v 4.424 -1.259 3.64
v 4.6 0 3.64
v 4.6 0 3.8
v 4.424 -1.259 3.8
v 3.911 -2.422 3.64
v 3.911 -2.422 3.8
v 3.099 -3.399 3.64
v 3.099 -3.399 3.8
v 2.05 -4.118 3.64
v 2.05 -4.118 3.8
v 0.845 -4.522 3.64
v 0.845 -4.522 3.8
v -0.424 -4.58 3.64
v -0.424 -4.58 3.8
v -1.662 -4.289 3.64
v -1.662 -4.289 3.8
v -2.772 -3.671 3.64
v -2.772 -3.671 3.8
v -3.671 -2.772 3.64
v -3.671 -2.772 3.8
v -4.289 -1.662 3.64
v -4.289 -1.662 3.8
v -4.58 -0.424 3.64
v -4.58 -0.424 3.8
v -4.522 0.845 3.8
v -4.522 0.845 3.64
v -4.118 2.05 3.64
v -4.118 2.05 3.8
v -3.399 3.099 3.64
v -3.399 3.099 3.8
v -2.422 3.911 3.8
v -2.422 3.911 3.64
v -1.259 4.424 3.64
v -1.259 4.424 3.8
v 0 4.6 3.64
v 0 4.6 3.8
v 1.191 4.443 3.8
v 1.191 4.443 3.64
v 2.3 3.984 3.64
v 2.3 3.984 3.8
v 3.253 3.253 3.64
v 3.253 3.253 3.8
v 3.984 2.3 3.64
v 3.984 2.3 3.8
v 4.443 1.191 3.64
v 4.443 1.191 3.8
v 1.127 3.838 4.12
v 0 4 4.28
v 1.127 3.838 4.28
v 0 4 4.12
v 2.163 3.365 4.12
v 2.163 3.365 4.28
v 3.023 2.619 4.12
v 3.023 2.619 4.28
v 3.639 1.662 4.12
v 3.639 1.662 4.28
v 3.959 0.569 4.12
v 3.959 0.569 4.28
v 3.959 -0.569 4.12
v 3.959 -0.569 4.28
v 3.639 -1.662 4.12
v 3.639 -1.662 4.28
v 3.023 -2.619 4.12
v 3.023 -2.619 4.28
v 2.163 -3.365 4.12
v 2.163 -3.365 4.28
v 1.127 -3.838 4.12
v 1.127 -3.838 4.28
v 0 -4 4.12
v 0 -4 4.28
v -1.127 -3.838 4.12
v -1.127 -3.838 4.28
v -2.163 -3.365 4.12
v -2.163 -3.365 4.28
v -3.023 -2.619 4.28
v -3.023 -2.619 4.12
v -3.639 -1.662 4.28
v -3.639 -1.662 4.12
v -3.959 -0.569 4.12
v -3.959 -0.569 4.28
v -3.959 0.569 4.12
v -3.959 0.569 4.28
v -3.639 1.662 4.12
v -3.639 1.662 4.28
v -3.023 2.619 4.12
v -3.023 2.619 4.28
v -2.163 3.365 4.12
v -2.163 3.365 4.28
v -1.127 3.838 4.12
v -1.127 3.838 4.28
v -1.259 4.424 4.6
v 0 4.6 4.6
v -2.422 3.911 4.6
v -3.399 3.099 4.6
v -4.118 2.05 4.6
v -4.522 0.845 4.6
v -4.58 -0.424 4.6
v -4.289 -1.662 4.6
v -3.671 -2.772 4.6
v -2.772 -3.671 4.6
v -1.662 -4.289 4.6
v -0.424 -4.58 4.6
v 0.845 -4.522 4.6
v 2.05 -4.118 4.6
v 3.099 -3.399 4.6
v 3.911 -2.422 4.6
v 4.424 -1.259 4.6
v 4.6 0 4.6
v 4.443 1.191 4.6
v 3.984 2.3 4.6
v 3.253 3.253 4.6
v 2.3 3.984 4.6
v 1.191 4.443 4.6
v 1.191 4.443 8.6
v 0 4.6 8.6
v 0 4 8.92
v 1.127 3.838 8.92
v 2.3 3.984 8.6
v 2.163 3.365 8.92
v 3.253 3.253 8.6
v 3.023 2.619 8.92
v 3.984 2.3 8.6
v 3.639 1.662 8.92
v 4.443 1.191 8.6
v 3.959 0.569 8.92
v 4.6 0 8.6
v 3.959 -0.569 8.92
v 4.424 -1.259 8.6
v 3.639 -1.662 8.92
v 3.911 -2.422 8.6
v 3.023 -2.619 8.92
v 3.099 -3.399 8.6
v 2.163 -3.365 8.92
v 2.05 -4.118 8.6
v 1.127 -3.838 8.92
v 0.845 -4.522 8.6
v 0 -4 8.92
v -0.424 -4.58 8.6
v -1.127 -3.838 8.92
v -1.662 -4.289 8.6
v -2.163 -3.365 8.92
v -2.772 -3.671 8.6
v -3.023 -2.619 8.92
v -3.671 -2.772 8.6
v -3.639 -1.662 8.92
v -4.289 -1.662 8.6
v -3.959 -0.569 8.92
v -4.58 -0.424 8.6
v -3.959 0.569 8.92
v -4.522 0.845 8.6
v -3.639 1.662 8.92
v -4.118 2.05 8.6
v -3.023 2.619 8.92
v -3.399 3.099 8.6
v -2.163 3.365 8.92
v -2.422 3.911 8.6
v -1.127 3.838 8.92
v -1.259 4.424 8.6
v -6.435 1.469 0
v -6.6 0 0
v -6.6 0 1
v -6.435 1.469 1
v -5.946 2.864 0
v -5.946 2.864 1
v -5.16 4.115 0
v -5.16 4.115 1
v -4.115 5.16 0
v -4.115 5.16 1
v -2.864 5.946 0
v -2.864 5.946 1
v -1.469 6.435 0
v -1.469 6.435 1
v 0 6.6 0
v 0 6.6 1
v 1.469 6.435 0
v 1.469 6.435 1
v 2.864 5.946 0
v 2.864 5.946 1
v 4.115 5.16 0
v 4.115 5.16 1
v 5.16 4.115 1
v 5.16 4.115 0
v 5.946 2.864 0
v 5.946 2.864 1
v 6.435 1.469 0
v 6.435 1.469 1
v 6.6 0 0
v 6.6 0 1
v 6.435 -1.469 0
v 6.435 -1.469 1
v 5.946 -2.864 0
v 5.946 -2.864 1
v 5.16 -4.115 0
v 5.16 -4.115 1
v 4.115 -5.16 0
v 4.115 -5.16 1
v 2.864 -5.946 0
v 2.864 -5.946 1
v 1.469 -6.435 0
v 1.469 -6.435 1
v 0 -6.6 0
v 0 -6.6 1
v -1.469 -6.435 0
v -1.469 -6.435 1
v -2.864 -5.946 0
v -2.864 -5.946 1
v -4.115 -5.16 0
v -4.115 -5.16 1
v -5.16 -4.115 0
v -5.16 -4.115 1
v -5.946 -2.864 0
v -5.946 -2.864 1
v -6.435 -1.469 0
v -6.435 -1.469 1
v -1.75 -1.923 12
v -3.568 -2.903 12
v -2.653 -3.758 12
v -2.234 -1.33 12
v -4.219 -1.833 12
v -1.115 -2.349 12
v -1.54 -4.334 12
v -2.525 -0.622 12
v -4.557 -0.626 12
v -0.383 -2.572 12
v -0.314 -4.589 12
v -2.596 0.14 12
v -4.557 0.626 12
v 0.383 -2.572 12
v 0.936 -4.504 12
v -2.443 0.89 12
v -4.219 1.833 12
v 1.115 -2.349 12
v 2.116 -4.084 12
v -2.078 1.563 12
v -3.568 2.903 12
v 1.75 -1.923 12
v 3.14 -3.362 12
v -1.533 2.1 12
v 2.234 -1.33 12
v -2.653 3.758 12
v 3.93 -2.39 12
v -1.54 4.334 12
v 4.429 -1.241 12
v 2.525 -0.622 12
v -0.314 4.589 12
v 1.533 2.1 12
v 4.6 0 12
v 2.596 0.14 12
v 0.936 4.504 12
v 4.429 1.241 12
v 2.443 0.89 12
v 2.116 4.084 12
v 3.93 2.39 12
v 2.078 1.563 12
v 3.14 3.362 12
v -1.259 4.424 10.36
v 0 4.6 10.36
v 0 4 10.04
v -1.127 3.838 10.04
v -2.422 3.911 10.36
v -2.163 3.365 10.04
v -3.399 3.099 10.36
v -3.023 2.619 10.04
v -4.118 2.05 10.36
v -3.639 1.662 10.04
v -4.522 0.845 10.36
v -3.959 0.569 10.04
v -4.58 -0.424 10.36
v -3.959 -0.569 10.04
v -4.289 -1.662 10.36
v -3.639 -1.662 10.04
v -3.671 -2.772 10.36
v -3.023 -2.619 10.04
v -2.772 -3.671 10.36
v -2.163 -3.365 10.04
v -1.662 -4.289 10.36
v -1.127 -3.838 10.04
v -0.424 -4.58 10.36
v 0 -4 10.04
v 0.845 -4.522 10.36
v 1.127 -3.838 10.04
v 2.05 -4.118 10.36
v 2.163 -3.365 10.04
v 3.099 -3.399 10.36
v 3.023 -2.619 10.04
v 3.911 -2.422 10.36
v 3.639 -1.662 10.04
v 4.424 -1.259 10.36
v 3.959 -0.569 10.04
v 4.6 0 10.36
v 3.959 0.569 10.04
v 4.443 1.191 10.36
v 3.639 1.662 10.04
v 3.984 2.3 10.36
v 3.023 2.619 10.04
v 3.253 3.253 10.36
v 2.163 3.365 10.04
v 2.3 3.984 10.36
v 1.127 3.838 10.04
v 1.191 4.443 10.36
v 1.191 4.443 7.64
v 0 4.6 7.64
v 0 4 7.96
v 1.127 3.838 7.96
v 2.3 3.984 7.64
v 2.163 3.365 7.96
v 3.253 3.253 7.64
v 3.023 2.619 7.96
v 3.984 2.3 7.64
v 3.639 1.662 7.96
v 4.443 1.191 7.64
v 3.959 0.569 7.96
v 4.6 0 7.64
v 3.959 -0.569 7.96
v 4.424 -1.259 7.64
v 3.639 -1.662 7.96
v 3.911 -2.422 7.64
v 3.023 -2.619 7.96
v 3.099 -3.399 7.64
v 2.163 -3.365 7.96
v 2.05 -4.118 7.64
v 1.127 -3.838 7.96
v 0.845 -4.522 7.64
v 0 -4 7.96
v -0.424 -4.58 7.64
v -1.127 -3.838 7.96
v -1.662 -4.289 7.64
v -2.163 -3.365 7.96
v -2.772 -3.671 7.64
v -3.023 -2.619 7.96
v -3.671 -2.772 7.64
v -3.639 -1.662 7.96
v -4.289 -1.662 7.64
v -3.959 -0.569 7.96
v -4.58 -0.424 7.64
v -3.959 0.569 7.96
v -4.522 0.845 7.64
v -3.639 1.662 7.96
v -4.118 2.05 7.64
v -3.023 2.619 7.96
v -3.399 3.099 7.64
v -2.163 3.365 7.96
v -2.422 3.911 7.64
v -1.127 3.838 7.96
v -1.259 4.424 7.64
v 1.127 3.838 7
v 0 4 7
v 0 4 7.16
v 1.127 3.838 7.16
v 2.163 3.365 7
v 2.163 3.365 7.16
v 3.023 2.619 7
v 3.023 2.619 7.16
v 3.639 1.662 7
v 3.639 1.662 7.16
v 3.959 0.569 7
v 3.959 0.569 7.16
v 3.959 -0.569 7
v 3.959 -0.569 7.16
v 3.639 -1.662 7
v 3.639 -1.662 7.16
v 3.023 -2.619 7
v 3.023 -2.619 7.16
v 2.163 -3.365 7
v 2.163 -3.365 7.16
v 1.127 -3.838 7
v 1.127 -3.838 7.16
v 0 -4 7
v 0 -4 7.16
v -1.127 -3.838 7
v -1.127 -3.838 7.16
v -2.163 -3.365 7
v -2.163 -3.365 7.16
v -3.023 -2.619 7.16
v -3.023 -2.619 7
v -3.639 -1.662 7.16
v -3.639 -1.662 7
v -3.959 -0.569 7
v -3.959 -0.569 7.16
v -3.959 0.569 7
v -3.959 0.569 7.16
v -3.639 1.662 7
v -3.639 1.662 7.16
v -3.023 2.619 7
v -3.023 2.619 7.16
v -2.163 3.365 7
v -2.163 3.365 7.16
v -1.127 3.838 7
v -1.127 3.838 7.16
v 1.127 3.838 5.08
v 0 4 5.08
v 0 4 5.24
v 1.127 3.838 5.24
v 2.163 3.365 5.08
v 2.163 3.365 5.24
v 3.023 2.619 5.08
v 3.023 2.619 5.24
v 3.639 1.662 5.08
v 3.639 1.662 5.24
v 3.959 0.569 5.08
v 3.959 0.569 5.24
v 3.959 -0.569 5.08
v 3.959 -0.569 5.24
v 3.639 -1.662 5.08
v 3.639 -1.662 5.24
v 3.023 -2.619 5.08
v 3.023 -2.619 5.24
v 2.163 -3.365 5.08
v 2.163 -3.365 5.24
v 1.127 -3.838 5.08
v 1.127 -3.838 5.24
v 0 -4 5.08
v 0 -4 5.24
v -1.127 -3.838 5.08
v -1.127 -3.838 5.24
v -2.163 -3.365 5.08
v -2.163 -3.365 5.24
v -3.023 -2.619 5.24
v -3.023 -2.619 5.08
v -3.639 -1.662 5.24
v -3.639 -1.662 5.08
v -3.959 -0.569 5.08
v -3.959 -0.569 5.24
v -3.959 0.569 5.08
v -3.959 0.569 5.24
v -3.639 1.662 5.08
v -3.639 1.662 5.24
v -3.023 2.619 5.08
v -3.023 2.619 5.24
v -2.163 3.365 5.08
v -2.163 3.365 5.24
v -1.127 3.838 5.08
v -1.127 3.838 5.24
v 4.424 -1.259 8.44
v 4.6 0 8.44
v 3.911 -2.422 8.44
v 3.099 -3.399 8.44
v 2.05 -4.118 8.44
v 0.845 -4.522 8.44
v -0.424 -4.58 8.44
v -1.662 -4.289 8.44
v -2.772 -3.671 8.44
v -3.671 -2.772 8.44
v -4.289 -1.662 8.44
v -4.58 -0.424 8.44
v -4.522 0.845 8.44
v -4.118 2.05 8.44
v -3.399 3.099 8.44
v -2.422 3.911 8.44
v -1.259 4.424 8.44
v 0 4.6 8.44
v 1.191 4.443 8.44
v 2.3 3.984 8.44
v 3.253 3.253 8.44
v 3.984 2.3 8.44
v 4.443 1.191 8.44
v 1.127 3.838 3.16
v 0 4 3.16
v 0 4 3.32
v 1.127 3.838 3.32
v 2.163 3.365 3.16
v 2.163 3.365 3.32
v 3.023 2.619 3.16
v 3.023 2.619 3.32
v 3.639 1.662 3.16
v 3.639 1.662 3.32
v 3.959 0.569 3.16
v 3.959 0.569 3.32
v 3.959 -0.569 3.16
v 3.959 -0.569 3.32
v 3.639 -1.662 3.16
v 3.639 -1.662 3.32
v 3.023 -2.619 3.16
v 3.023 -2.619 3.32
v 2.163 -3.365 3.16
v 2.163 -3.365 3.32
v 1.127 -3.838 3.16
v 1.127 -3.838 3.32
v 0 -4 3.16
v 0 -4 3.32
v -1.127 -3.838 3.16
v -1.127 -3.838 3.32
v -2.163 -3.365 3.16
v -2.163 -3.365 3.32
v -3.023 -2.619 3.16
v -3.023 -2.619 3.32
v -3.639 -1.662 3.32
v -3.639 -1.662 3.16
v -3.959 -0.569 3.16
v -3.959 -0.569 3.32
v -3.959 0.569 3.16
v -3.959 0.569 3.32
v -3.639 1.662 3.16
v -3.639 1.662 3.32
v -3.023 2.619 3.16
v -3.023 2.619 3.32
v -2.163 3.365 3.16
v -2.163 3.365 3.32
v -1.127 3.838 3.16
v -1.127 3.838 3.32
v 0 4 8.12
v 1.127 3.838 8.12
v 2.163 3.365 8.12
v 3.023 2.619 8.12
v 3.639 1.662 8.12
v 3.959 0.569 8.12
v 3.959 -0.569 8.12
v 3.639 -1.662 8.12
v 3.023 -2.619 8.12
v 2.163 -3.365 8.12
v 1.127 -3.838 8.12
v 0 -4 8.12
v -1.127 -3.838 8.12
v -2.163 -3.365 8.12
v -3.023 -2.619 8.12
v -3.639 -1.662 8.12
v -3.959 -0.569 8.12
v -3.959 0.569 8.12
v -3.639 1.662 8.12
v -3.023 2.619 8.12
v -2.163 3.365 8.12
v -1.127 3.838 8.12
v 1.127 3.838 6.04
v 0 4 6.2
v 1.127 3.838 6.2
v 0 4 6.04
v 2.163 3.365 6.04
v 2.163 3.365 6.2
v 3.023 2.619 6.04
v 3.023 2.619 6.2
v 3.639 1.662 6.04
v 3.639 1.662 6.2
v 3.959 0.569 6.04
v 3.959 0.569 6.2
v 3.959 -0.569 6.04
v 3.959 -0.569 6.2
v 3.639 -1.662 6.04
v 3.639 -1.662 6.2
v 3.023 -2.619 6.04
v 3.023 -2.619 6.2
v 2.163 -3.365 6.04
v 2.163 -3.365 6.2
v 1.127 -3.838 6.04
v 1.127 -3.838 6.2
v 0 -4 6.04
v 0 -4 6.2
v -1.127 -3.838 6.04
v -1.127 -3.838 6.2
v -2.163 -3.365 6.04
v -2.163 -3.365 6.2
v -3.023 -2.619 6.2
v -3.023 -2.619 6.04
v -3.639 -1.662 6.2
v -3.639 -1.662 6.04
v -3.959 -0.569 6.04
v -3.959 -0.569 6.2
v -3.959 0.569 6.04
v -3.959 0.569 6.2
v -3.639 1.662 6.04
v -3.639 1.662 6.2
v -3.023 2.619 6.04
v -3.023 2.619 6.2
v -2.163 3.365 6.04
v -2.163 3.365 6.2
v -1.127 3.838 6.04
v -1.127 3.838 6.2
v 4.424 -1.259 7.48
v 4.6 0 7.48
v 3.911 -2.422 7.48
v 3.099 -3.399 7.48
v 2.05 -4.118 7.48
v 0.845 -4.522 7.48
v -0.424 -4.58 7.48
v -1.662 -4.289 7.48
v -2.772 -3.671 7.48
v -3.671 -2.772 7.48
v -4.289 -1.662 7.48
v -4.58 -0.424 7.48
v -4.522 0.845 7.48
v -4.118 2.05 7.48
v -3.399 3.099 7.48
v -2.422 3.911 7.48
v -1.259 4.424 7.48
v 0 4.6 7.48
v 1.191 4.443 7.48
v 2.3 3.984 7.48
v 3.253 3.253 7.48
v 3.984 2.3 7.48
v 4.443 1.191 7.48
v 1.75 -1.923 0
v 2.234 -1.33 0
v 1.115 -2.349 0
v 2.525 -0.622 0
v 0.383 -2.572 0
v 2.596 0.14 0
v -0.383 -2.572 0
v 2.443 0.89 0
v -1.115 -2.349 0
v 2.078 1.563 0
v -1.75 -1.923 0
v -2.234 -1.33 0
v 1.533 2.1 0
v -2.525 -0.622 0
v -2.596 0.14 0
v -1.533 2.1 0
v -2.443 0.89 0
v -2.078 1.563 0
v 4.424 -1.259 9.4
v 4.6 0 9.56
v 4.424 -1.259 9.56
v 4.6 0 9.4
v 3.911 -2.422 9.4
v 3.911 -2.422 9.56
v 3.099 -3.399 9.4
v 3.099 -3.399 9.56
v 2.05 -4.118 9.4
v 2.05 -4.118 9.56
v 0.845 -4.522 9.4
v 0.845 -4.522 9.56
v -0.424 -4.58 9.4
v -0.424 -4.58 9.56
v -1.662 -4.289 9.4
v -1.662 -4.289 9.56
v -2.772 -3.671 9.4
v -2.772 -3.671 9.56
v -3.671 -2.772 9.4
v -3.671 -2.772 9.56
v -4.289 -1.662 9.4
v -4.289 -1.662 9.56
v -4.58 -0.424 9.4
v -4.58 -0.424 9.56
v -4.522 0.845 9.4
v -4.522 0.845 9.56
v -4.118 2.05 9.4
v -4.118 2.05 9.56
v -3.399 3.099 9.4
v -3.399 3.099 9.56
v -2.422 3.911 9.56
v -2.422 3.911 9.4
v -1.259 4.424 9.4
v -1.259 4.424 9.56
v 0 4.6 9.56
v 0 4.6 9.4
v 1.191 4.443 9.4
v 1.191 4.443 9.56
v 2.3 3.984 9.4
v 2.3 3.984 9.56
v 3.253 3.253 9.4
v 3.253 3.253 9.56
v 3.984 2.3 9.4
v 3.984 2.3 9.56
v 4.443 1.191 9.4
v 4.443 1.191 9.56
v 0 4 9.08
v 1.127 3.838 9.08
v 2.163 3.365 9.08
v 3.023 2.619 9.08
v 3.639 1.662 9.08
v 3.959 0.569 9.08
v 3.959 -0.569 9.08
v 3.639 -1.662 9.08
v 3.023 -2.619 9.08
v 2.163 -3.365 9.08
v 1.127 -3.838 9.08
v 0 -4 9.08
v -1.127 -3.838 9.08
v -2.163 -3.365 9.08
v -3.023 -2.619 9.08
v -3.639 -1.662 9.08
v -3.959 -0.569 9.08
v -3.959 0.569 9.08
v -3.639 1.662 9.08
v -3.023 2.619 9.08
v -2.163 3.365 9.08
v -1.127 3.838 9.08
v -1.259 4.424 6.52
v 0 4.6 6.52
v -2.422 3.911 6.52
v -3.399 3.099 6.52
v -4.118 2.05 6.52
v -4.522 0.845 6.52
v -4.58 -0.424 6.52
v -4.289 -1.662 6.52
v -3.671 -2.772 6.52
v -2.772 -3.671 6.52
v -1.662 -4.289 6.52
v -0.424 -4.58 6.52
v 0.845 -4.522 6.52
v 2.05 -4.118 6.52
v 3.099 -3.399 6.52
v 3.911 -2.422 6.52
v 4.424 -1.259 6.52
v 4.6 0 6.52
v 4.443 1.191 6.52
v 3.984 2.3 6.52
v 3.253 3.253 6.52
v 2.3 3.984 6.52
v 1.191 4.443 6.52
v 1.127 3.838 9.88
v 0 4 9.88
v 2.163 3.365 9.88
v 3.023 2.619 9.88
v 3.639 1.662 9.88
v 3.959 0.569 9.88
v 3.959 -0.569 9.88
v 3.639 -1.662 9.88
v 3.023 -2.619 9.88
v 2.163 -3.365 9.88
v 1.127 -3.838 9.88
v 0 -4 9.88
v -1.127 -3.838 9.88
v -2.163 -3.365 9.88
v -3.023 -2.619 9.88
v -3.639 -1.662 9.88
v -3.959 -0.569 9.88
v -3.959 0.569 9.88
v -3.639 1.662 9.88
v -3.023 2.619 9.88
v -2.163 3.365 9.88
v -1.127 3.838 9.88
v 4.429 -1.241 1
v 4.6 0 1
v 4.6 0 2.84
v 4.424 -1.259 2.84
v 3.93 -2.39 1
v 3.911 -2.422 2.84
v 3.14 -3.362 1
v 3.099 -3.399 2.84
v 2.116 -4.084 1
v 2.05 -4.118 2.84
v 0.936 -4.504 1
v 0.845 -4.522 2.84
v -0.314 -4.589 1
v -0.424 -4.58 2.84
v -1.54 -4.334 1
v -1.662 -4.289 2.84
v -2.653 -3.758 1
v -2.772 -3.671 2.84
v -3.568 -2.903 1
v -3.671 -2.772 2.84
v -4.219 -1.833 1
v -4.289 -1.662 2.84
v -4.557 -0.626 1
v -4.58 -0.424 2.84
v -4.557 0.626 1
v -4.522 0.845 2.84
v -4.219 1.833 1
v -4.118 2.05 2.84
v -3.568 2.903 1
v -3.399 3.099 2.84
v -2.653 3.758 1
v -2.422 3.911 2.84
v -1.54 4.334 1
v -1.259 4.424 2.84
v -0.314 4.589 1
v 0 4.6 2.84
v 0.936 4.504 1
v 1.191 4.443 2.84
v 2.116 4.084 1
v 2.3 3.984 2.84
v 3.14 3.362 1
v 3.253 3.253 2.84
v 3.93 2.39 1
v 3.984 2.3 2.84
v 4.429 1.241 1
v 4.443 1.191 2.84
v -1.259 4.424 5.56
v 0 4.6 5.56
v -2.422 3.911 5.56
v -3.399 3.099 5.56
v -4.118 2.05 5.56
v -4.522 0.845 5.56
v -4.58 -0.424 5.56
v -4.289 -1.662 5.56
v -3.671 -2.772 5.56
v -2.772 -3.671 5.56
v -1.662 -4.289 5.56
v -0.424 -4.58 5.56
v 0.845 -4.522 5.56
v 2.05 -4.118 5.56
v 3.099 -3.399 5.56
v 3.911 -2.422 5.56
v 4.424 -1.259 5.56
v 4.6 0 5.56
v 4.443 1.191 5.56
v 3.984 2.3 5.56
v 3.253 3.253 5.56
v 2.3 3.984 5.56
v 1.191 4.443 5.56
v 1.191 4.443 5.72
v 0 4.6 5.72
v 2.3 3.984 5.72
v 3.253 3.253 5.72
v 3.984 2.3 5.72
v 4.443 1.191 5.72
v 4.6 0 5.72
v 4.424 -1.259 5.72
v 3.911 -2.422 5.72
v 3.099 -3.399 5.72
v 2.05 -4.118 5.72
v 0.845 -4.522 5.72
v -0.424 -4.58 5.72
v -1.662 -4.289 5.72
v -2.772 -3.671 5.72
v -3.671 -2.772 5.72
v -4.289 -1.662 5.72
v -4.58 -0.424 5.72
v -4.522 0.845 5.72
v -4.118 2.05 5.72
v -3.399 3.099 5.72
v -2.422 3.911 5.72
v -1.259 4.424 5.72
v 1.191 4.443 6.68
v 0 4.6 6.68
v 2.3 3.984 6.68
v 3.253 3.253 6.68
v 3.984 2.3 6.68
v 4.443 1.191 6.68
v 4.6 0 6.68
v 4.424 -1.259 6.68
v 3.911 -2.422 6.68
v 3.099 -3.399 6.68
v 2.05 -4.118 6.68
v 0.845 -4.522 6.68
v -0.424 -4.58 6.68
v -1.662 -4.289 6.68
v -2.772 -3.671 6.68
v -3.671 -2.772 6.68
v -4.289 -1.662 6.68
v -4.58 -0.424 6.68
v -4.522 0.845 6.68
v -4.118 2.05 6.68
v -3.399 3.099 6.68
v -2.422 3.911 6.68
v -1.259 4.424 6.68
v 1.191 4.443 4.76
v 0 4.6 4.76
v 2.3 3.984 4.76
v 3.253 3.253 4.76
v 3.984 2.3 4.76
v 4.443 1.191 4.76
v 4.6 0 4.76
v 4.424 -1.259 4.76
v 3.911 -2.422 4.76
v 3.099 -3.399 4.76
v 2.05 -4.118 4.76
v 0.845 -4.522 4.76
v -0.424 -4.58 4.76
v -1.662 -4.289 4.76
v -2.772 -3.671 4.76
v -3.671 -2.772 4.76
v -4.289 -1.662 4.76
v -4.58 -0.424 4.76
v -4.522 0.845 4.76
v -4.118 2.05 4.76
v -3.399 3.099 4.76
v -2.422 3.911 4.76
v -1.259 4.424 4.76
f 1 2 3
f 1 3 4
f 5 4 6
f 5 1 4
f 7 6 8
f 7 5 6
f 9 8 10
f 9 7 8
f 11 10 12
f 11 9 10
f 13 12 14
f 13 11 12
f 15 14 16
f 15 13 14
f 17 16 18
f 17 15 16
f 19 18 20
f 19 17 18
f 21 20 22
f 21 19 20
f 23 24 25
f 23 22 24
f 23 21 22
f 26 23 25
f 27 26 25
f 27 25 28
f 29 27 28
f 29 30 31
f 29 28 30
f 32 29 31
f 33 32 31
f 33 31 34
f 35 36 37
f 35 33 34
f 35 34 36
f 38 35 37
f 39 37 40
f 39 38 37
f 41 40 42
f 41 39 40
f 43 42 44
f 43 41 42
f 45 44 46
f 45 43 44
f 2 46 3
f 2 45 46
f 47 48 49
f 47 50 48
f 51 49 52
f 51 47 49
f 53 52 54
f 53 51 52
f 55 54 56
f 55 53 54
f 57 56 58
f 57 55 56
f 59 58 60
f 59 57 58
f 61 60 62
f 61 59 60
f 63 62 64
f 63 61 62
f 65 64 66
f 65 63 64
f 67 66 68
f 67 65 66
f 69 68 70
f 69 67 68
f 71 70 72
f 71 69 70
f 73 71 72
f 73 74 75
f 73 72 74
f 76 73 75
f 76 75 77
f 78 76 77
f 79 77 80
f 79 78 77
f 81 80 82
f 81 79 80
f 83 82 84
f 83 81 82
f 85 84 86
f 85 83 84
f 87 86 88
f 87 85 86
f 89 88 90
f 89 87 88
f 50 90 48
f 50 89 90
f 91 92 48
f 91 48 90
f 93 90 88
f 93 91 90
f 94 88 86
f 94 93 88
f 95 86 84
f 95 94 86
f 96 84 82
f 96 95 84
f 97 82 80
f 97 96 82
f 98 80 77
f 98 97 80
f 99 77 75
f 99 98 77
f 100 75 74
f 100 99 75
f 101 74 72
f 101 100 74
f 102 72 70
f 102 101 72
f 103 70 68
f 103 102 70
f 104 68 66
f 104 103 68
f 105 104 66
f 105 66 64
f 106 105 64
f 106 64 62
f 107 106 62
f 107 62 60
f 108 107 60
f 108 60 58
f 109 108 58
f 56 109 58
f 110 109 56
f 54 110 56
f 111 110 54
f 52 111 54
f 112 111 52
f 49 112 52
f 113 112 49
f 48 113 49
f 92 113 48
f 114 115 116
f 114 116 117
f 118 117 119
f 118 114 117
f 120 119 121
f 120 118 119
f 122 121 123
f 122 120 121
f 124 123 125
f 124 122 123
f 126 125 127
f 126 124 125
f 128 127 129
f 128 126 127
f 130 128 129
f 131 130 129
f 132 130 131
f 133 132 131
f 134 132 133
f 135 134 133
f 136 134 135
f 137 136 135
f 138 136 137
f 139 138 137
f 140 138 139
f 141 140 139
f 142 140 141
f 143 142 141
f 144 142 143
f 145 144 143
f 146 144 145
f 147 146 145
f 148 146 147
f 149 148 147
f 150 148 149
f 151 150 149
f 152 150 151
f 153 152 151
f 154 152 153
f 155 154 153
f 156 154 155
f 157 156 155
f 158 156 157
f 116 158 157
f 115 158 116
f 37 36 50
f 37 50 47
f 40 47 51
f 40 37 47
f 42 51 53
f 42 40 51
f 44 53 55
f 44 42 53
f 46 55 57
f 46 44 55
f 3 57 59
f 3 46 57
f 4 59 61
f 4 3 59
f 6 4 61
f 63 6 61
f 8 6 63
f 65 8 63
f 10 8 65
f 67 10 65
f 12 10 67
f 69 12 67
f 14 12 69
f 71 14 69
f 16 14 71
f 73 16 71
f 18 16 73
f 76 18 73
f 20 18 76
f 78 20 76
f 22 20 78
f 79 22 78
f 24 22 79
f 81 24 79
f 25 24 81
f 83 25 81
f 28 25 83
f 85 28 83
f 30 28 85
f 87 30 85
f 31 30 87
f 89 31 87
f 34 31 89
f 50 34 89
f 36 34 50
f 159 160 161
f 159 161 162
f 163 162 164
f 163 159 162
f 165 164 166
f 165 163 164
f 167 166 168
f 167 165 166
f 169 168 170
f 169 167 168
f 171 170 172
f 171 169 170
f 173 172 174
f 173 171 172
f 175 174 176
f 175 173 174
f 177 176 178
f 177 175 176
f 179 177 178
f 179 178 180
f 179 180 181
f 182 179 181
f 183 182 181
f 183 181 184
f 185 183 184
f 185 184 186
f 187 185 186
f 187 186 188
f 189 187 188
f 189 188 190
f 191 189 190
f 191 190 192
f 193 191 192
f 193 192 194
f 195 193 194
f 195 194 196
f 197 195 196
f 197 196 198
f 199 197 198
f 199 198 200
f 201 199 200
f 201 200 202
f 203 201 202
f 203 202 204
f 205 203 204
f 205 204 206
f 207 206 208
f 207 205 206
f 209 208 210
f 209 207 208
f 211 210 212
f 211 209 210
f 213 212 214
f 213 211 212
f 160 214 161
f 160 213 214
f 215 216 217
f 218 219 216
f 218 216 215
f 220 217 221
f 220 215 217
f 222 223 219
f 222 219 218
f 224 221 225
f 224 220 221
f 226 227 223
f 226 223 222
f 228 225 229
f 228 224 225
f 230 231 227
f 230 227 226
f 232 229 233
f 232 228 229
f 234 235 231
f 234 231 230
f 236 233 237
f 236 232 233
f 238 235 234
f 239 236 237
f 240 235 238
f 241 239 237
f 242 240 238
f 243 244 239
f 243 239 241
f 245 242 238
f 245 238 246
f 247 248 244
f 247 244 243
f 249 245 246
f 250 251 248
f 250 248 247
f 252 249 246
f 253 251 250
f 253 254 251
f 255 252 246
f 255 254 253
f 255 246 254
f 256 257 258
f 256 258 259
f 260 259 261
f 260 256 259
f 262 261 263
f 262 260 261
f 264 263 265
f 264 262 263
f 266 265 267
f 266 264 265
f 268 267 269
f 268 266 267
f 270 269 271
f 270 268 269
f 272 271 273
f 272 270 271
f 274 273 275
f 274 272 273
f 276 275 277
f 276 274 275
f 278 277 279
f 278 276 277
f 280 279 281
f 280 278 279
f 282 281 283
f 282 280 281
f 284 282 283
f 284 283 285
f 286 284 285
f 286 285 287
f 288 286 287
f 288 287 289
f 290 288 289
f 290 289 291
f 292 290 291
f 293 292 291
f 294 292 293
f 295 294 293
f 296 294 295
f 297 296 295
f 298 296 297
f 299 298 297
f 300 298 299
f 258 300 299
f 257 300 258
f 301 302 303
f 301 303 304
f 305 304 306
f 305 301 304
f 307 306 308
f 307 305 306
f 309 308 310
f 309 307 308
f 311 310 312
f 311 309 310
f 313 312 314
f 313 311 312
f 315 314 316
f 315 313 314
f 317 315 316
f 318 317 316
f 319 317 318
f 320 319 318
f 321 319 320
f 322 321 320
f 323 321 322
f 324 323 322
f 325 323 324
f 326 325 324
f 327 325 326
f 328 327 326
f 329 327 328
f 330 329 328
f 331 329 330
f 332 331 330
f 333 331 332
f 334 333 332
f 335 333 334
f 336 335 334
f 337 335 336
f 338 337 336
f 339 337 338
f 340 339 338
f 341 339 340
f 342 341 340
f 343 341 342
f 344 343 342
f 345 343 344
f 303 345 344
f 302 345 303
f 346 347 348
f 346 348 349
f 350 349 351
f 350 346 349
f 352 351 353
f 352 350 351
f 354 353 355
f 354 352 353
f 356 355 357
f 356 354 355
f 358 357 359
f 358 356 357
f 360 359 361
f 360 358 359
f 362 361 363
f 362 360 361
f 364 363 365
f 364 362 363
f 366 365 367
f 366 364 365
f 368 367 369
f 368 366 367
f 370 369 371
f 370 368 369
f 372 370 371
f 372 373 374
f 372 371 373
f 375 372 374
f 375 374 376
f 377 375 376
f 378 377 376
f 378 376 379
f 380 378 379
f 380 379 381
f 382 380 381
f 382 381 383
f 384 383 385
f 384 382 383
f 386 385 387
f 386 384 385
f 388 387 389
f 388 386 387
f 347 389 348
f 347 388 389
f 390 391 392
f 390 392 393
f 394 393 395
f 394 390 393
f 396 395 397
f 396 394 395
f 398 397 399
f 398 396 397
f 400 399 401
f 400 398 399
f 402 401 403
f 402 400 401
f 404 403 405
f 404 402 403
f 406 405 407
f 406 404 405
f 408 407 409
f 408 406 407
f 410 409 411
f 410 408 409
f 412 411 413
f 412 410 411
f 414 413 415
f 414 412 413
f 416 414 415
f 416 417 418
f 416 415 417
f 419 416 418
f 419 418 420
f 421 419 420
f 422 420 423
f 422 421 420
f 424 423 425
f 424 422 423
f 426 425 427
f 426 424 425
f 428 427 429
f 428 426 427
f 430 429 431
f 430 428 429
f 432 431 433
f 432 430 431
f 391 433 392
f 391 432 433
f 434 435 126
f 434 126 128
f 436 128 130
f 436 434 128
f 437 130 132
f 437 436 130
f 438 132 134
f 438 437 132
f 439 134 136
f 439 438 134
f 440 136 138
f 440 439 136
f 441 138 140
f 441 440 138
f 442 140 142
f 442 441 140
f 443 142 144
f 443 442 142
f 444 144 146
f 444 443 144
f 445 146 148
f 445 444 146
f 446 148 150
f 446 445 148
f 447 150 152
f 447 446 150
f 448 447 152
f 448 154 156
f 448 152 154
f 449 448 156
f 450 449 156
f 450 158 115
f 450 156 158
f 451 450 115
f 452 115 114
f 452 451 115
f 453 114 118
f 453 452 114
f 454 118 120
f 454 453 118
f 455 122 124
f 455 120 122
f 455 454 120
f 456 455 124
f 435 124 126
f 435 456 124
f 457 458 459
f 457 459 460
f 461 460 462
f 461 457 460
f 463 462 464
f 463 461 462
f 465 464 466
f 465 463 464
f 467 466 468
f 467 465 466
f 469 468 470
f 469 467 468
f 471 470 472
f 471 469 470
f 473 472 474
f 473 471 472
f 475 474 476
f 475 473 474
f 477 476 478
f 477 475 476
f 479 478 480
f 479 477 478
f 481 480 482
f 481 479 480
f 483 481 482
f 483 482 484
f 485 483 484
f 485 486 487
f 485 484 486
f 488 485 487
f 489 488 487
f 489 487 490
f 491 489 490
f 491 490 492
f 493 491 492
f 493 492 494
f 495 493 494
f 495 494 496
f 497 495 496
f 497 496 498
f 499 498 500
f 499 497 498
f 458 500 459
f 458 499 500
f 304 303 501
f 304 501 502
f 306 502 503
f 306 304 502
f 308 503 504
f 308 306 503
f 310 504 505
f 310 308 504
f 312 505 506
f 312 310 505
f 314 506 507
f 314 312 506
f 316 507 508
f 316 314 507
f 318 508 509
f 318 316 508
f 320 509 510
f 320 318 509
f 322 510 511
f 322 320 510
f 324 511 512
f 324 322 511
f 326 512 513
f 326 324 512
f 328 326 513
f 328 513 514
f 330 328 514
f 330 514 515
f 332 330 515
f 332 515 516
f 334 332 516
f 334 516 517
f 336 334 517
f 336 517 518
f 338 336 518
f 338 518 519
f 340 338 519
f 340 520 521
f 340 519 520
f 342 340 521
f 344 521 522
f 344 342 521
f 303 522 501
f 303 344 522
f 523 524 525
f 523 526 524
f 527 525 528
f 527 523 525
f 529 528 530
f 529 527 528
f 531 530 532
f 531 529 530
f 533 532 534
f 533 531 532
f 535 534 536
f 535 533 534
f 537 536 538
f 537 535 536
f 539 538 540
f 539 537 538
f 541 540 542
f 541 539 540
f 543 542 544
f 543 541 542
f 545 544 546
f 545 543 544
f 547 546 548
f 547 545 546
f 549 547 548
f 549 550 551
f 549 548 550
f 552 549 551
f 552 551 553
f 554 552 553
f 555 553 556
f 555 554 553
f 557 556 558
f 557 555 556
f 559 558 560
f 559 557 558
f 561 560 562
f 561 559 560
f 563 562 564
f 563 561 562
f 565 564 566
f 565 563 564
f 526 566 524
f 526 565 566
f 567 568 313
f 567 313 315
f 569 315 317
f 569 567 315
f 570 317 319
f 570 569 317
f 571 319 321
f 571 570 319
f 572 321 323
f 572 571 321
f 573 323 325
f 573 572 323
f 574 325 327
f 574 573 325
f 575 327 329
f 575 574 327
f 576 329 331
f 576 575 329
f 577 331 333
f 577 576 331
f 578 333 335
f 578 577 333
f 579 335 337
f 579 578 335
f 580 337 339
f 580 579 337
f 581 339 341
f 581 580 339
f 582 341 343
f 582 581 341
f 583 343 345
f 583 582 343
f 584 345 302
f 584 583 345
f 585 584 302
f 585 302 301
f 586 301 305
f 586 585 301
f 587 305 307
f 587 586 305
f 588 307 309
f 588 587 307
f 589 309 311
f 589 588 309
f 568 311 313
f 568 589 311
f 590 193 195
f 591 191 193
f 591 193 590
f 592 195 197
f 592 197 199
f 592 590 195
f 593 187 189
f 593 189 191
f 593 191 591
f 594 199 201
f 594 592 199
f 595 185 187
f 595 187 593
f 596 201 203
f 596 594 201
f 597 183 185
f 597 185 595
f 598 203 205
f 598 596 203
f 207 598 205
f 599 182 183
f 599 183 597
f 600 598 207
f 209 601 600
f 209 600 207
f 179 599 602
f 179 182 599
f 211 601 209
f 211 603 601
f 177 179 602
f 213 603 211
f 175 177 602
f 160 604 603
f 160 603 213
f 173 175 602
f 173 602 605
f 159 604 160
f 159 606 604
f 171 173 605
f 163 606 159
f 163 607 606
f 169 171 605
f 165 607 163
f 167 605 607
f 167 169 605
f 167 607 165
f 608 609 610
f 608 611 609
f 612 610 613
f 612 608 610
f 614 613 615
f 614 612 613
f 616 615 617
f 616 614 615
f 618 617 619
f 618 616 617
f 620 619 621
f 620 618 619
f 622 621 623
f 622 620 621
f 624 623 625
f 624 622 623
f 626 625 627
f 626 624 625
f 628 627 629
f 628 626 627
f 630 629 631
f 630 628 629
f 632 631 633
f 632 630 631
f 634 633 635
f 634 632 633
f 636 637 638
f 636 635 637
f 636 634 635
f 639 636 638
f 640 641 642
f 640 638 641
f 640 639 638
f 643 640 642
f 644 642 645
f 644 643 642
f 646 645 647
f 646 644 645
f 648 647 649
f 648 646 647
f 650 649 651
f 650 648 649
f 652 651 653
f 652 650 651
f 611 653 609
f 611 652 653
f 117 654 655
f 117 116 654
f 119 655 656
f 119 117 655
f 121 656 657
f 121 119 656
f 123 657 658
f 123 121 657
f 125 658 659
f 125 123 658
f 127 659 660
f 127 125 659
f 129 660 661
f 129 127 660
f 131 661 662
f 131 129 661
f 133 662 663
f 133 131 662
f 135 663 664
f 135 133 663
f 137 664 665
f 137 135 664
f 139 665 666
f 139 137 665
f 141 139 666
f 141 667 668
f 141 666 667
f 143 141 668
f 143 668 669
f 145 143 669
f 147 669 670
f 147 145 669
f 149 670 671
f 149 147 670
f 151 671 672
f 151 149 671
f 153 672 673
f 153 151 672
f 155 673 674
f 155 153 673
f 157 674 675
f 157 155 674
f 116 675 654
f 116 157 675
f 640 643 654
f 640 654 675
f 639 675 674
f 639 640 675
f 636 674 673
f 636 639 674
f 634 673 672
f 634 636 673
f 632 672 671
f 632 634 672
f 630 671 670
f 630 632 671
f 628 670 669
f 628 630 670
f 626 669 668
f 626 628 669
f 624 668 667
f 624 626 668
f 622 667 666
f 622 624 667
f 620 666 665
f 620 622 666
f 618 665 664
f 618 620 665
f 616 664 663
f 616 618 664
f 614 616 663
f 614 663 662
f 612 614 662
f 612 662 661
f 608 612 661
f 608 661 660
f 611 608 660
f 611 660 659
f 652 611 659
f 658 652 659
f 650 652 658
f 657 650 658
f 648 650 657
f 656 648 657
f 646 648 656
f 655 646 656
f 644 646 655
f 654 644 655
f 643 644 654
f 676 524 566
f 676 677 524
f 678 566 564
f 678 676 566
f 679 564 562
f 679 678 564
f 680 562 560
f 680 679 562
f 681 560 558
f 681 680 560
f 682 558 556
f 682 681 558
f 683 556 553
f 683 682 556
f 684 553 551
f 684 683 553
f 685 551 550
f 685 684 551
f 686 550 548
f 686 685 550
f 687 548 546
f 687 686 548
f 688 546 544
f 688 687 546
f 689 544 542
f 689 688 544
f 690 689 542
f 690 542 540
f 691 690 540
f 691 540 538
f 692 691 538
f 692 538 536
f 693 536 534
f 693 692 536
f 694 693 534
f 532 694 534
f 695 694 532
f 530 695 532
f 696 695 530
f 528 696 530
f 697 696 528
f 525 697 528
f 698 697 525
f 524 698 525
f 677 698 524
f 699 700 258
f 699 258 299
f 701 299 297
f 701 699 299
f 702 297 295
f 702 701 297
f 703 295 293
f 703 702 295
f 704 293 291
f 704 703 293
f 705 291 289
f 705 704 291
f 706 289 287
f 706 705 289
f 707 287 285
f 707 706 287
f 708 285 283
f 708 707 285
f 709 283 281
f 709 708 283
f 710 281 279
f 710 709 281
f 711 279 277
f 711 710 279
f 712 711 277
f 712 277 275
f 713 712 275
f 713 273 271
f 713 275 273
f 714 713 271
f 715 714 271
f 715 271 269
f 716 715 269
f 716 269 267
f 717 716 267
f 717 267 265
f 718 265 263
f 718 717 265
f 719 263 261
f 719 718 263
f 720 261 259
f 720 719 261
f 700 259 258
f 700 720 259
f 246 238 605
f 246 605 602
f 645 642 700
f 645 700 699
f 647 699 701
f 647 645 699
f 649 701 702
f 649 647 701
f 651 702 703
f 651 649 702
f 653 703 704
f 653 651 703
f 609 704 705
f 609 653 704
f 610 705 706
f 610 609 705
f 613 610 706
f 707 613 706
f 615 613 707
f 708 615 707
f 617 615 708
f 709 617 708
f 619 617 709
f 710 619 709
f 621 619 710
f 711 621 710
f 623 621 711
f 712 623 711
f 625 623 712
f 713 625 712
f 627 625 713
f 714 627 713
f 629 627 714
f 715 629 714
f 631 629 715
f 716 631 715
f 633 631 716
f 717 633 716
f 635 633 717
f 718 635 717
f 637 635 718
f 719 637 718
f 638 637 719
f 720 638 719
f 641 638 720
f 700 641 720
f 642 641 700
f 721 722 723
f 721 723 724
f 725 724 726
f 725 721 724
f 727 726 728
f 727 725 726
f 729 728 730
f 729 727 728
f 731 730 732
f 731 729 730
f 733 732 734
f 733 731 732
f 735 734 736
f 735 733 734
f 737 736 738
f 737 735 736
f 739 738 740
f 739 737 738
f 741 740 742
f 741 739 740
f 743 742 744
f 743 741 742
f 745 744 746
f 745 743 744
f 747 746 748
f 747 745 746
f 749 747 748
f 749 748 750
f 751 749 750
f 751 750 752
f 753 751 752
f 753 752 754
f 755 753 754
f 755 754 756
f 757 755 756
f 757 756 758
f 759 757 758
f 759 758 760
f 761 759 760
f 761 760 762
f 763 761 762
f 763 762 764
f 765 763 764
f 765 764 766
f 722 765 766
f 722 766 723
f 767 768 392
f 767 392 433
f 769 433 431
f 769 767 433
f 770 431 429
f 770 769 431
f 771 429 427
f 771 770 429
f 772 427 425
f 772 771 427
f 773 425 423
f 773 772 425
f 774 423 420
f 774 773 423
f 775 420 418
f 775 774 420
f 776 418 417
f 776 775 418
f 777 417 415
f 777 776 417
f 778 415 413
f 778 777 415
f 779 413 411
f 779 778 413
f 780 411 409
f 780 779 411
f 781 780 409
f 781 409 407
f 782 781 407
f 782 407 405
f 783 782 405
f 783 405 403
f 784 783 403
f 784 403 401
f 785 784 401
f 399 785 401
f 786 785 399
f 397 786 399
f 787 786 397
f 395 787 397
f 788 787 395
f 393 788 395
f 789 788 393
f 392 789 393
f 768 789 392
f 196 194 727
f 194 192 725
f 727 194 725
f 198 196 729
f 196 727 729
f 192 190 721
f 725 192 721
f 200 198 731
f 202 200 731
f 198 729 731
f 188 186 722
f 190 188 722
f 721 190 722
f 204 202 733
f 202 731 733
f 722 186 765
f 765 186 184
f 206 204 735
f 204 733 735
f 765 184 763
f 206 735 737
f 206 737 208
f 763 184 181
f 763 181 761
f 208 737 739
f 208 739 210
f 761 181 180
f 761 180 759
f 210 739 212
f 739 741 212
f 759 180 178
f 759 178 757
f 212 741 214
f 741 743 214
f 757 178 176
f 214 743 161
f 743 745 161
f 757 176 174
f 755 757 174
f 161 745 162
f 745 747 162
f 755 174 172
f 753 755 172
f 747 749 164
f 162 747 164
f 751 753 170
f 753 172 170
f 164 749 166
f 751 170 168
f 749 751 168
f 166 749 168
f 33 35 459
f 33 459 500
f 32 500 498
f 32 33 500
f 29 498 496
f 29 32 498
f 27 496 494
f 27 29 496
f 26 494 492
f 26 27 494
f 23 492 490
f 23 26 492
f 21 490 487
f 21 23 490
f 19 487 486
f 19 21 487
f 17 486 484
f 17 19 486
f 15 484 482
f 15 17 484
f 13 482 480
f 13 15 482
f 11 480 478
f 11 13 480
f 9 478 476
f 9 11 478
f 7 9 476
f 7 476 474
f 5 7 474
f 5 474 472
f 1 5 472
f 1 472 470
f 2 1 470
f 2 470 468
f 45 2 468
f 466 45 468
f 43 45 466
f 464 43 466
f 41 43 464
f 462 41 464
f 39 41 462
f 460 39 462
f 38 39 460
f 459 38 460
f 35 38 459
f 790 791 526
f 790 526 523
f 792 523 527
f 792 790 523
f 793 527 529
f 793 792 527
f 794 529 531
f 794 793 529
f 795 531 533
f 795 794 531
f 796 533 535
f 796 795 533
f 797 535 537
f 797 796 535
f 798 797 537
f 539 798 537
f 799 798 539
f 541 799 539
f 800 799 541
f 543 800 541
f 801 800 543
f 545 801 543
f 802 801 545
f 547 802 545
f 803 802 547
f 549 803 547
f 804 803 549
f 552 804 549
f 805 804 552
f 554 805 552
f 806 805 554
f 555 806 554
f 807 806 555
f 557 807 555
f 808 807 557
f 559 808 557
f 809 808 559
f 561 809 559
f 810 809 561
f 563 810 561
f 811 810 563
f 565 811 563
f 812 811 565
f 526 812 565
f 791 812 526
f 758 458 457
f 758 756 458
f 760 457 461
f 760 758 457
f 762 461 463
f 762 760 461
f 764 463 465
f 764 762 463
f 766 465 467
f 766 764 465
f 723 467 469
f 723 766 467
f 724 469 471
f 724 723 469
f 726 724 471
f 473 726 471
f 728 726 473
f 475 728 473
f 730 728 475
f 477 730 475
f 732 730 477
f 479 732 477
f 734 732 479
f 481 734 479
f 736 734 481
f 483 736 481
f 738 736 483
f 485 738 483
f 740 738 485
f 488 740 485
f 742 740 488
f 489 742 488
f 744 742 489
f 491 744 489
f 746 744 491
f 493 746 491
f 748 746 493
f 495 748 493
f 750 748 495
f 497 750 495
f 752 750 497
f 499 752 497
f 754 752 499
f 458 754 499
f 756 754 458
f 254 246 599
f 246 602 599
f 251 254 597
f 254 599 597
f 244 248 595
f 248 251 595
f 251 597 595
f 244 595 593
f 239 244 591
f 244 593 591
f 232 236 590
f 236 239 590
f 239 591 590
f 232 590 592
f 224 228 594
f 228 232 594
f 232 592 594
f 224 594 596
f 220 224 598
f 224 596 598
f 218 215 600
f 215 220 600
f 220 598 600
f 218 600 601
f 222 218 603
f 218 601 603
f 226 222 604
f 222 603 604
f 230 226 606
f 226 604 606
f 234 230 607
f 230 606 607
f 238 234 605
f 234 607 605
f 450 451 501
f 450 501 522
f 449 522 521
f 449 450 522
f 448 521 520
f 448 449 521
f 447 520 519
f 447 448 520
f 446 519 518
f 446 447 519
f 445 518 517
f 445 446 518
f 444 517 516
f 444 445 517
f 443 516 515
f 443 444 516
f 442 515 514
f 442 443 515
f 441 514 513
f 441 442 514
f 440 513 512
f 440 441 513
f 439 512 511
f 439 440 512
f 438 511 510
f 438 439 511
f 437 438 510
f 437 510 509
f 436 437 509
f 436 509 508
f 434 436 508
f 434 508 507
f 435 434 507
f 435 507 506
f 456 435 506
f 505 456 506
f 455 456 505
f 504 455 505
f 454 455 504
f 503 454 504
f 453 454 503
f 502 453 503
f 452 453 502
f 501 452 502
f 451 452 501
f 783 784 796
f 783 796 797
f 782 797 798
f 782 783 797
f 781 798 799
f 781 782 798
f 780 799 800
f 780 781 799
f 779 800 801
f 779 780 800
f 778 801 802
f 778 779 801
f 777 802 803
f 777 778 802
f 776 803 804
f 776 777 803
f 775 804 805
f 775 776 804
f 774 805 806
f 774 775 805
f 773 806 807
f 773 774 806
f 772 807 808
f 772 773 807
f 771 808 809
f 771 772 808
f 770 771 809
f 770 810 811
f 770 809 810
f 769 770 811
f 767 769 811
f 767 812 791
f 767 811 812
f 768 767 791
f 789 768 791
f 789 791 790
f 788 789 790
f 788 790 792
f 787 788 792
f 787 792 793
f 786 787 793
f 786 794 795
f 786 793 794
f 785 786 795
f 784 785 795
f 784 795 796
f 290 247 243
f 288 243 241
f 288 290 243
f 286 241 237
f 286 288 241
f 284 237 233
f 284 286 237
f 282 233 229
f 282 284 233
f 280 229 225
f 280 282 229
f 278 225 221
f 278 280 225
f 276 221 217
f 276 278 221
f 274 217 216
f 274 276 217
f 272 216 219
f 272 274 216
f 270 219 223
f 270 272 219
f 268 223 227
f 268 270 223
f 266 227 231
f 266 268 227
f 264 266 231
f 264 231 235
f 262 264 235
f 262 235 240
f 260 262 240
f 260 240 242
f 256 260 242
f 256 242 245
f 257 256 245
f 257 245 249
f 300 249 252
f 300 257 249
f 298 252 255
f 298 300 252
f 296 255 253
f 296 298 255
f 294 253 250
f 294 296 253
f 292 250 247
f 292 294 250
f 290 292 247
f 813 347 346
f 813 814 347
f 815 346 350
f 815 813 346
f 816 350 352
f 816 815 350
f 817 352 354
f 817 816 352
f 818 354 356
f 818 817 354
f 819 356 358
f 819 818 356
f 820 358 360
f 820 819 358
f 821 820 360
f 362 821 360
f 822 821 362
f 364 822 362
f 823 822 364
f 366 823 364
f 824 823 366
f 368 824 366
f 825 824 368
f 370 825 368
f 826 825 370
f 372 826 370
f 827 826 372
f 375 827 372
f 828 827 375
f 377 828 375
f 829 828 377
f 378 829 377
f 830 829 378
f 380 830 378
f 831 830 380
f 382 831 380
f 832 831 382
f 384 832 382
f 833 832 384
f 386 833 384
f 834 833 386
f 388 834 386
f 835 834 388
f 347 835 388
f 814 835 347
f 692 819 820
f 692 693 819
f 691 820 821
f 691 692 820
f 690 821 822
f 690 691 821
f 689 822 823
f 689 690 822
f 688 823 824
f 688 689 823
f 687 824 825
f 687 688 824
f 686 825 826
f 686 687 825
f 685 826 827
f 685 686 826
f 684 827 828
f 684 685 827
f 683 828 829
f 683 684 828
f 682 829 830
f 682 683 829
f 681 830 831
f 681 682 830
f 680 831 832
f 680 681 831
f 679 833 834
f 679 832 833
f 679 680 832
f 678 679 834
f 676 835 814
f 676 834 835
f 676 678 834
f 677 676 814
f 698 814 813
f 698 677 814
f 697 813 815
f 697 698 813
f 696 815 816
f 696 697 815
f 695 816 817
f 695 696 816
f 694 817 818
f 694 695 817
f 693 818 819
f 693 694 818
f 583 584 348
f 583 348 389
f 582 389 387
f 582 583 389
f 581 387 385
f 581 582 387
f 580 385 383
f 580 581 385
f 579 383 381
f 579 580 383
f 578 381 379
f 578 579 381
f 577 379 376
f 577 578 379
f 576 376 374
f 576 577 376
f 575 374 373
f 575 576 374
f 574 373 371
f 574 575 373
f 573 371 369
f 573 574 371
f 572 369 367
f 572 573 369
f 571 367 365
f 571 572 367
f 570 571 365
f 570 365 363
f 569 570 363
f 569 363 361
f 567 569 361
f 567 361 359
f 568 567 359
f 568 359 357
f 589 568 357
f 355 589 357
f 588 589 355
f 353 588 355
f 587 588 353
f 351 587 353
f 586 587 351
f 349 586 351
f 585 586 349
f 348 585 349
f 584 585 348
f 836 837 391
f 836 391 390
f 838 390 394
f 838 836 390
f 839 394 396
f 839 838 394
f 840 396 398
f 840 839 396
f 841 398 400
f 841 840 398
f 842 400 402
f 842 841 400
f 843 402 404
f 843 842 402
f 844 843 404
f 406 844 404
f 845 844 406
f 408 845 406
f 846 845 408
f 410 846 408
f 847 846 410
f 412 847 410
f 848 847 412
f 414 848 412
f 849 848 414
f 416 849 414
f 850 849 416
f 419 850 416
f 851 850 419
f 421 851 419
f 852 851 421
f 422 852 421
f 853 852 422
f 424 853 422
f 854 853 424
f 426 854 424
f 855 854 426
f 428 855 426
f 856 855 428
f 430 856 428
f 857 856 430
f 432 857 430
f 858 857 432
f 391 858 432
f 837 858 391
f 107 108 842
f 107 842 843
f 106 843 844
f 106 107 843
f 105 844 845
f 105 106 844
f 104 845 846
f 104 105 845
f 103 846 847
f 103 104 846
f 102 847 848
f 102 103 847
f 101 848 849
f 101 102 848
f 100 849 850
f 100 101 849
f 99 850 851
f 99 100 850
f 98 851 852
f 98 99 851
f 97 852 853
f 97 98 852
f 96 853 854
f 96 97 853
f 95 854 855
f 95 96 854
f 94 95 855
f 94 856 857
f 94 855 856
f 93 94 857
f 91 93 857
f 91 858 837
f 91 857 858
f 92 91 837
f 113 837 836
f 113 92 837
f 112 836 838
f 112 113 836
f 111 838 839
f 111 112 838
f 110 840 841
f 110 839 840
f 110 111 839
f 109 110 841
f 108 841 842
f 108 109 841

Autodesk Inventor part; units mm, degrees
ref_plane "YZ Plane" through (0, 0, 0) normal (1, 0, 0) x (0, 1, 0)
ref_plane "XZ Plane" through (0, 0, 0) normal (0, 1, 0) x (-1, 0, 0)
ref_plane "XY Plane" through (0, 0, 0) normal (0, 0, 1) x (1, 0, 0)
sketch "Sketch1" plane through (0, 0, 0) normal (0, 0, 1) x (1, 0, 0)
  line L0 (1.5, 2) -> (-1.5, 2) construction
  arc A0 (-1.5, 2) -> (1.5, 2) centre (0, 0) ccw construction
  circle A1 centre (0, 0) radius 11 construction
  arc A2 (-1.5, 2) -> (1.5, 2) centre (0, 0) ccw construction
  line L1 (1.5, 2) -> (-1.5, 2) construction
  circle A3 centre (0, 0) radius 4.6
  arc A4 (-1.533, 2.1) -> (1.533, 2.1) centre (0, 0) ccw
  line L2 (-1.533, 2.1) -> (1.533, 2.1)
  dimension "d0" = 9.2
  dimension "d1" = 5.2
  dimension "d2" = 0.1
extrude "Extrusion1" add sketch "Sketch1" along normal blind 12
sketch "Sketch2" plane through (0, 0, 0) normal (1, 0, 0) x (0, 1, 0)
  line L0 (0, 12.2) -> (21, 12.2) construction
  line L1 (8.4705, 1) -> (21, 1) construction
  line L2 (0, -2.44) -> (0, 14.64) projected
  line L3 (4.6, 0) -> (4.6, 12) construction
  line L4 (4.6, 10.36) -> (3.8845, 10.36) construction
  line L5 (4.6, 0) -> (4.6, 12) construction
  line L6 (4.6, 9.56) -> (3.8621, 9.56) construction
  line L7 (4.6, 10.36) -> (4, 10.04)
  line L8 (4, 10.04) -> (4, 9.88)
  line L9 (4.6, 0) -> (4.6, 12) construction
  line L10 (4, 9.88) -> (4.6, 9.56)
  line L11 (4.6, 9.56) -> (4.6, 9.4)
  line L12 (4.6, 0) -> (4.6, 12) construction
  line L13 (4.6, 9.4) -> (4, 9.08)
  line L14 (4, 9.08) -> (4, 8.92)
  line L15 (4, 8.92) -> (4.6, 8.6)
  line L16 (4.6, 8.6) -> (4.6, 8.44)
  line L17 (4.6, 8.44) -> (4, 8.12)
  line L18 (4, 8.12) -> (4, 7.96)
  line L19 (4, 7.96) -> (4.6, 7.64)
  line L20 (4.6, 7.64) -> (4.6, 7.48)
  line L21 (4.6, 7.48) -> (4, 7.16)
  line L22 (4, 7.16) -> (4, 7)
  line L23 (4, 7) -> (4.6, 6.68)
  line L24 (4.6, 6.68) -> (4.6, 6.52)
  line L25 (4.6, 6.52) -> (4, 6.2)
  line L26 (4, 6.2) -> (4, 6.04)
  line L27 (4, 6.04) -> (4.6, 5.72)
  line L28 (4.6, 5.72) -> (4.6, 5.56)
  line L29 (4.6, 5.56) -> (4, 5.24)
  line L30 (4, 5.24) -> (4, 5.08)
  line L31 (4, 5.08) -> (4.6, 4.76)
  line L32 (4.6, 4.76) -> (4.6, 4.6)
  line L33 (4.6, 4.6) -> (4, 4.28)
  line L34 (4, 4.28) -> (4, 4.12)
  line L35 (4, 4.12) -> (4.6, 3.8)
  line L36 (4.6, 3.8) -> (4.6, 3.64)
  line L37 (4.6, 3.64) -> (4, 3.32)
  line L38 (4, 3.32) -> (4, 3.16)
  line L39 (4, 3.16) -> (4.6, 2.84)
  line L40 (4.6, 2.84) -> (4.6, 2.68)
  line L41 (4.6, 10.36) -> (4.6, 12.2) construction
  line L42 (4.6, 10.36) -> (6.2592, 10.36) construction
  line L43 (6.2592, 10.36) -> (6.2592, 12.2) construction
  line L44 (4.6, 2.84) -> (5.8943, 2.84) construction
  line L45 (5.8943, 2.84) -> (5.8943, 1) construction
  line L46 (4.6, 10.36) -> (4.6, 9.56)
  line L47 (4.6, 9.4) -> (4.6, 8.6)
  line L48 (4.6, 8.44) -> (4.6, 7.64)
  line L49 (4.6, 7.48) -> (4.6, 6.68)
  line L50 (4.6, 0) -> (4.6, 12) projected
  line L51 (4.6, 6.52) -> (4.6, 5.72)
  line L52 (4.6, 0) -> (4.6, 12) projected
  line L53 (4.6, 5.56) -> (4.6, 4.76)
  line L54 (4.6, 4.6) -> (4.6, 3.8)
  line L55 (4.6, 0) -> (4.6, 12) projected
  line L56 (4.6, 3.64) -> (4.6, 2.84)
  line L57 (4.6, 0) -> (4.6, 12) projected
  point P0 (0, 0)
  dimension "d6" = 0.8
  dimension "d7" = 0.16
  dimension "d8" = 0.6
  dimension "d9" = 0.16
  dimension "d12" = 0.96
revolve "Revolution1" cut sketch "Sketch2" angle 360 about axis through (0, 0, -10) along (0, 0, 1)
sketch "Sketch3" plane through (0, 0, 0) normal (0, 0, -1) x (-1, 0, 0)
  circle A0 centre (0, 0) radius 4.6 projected
  circle A1 centre (0, 0) radius 6.6
  dimension "d17" = 2
extrude "Extrusion2" add sketch "Sketch3" against normal blind 1
properties part number "NewDriveWheel2"
